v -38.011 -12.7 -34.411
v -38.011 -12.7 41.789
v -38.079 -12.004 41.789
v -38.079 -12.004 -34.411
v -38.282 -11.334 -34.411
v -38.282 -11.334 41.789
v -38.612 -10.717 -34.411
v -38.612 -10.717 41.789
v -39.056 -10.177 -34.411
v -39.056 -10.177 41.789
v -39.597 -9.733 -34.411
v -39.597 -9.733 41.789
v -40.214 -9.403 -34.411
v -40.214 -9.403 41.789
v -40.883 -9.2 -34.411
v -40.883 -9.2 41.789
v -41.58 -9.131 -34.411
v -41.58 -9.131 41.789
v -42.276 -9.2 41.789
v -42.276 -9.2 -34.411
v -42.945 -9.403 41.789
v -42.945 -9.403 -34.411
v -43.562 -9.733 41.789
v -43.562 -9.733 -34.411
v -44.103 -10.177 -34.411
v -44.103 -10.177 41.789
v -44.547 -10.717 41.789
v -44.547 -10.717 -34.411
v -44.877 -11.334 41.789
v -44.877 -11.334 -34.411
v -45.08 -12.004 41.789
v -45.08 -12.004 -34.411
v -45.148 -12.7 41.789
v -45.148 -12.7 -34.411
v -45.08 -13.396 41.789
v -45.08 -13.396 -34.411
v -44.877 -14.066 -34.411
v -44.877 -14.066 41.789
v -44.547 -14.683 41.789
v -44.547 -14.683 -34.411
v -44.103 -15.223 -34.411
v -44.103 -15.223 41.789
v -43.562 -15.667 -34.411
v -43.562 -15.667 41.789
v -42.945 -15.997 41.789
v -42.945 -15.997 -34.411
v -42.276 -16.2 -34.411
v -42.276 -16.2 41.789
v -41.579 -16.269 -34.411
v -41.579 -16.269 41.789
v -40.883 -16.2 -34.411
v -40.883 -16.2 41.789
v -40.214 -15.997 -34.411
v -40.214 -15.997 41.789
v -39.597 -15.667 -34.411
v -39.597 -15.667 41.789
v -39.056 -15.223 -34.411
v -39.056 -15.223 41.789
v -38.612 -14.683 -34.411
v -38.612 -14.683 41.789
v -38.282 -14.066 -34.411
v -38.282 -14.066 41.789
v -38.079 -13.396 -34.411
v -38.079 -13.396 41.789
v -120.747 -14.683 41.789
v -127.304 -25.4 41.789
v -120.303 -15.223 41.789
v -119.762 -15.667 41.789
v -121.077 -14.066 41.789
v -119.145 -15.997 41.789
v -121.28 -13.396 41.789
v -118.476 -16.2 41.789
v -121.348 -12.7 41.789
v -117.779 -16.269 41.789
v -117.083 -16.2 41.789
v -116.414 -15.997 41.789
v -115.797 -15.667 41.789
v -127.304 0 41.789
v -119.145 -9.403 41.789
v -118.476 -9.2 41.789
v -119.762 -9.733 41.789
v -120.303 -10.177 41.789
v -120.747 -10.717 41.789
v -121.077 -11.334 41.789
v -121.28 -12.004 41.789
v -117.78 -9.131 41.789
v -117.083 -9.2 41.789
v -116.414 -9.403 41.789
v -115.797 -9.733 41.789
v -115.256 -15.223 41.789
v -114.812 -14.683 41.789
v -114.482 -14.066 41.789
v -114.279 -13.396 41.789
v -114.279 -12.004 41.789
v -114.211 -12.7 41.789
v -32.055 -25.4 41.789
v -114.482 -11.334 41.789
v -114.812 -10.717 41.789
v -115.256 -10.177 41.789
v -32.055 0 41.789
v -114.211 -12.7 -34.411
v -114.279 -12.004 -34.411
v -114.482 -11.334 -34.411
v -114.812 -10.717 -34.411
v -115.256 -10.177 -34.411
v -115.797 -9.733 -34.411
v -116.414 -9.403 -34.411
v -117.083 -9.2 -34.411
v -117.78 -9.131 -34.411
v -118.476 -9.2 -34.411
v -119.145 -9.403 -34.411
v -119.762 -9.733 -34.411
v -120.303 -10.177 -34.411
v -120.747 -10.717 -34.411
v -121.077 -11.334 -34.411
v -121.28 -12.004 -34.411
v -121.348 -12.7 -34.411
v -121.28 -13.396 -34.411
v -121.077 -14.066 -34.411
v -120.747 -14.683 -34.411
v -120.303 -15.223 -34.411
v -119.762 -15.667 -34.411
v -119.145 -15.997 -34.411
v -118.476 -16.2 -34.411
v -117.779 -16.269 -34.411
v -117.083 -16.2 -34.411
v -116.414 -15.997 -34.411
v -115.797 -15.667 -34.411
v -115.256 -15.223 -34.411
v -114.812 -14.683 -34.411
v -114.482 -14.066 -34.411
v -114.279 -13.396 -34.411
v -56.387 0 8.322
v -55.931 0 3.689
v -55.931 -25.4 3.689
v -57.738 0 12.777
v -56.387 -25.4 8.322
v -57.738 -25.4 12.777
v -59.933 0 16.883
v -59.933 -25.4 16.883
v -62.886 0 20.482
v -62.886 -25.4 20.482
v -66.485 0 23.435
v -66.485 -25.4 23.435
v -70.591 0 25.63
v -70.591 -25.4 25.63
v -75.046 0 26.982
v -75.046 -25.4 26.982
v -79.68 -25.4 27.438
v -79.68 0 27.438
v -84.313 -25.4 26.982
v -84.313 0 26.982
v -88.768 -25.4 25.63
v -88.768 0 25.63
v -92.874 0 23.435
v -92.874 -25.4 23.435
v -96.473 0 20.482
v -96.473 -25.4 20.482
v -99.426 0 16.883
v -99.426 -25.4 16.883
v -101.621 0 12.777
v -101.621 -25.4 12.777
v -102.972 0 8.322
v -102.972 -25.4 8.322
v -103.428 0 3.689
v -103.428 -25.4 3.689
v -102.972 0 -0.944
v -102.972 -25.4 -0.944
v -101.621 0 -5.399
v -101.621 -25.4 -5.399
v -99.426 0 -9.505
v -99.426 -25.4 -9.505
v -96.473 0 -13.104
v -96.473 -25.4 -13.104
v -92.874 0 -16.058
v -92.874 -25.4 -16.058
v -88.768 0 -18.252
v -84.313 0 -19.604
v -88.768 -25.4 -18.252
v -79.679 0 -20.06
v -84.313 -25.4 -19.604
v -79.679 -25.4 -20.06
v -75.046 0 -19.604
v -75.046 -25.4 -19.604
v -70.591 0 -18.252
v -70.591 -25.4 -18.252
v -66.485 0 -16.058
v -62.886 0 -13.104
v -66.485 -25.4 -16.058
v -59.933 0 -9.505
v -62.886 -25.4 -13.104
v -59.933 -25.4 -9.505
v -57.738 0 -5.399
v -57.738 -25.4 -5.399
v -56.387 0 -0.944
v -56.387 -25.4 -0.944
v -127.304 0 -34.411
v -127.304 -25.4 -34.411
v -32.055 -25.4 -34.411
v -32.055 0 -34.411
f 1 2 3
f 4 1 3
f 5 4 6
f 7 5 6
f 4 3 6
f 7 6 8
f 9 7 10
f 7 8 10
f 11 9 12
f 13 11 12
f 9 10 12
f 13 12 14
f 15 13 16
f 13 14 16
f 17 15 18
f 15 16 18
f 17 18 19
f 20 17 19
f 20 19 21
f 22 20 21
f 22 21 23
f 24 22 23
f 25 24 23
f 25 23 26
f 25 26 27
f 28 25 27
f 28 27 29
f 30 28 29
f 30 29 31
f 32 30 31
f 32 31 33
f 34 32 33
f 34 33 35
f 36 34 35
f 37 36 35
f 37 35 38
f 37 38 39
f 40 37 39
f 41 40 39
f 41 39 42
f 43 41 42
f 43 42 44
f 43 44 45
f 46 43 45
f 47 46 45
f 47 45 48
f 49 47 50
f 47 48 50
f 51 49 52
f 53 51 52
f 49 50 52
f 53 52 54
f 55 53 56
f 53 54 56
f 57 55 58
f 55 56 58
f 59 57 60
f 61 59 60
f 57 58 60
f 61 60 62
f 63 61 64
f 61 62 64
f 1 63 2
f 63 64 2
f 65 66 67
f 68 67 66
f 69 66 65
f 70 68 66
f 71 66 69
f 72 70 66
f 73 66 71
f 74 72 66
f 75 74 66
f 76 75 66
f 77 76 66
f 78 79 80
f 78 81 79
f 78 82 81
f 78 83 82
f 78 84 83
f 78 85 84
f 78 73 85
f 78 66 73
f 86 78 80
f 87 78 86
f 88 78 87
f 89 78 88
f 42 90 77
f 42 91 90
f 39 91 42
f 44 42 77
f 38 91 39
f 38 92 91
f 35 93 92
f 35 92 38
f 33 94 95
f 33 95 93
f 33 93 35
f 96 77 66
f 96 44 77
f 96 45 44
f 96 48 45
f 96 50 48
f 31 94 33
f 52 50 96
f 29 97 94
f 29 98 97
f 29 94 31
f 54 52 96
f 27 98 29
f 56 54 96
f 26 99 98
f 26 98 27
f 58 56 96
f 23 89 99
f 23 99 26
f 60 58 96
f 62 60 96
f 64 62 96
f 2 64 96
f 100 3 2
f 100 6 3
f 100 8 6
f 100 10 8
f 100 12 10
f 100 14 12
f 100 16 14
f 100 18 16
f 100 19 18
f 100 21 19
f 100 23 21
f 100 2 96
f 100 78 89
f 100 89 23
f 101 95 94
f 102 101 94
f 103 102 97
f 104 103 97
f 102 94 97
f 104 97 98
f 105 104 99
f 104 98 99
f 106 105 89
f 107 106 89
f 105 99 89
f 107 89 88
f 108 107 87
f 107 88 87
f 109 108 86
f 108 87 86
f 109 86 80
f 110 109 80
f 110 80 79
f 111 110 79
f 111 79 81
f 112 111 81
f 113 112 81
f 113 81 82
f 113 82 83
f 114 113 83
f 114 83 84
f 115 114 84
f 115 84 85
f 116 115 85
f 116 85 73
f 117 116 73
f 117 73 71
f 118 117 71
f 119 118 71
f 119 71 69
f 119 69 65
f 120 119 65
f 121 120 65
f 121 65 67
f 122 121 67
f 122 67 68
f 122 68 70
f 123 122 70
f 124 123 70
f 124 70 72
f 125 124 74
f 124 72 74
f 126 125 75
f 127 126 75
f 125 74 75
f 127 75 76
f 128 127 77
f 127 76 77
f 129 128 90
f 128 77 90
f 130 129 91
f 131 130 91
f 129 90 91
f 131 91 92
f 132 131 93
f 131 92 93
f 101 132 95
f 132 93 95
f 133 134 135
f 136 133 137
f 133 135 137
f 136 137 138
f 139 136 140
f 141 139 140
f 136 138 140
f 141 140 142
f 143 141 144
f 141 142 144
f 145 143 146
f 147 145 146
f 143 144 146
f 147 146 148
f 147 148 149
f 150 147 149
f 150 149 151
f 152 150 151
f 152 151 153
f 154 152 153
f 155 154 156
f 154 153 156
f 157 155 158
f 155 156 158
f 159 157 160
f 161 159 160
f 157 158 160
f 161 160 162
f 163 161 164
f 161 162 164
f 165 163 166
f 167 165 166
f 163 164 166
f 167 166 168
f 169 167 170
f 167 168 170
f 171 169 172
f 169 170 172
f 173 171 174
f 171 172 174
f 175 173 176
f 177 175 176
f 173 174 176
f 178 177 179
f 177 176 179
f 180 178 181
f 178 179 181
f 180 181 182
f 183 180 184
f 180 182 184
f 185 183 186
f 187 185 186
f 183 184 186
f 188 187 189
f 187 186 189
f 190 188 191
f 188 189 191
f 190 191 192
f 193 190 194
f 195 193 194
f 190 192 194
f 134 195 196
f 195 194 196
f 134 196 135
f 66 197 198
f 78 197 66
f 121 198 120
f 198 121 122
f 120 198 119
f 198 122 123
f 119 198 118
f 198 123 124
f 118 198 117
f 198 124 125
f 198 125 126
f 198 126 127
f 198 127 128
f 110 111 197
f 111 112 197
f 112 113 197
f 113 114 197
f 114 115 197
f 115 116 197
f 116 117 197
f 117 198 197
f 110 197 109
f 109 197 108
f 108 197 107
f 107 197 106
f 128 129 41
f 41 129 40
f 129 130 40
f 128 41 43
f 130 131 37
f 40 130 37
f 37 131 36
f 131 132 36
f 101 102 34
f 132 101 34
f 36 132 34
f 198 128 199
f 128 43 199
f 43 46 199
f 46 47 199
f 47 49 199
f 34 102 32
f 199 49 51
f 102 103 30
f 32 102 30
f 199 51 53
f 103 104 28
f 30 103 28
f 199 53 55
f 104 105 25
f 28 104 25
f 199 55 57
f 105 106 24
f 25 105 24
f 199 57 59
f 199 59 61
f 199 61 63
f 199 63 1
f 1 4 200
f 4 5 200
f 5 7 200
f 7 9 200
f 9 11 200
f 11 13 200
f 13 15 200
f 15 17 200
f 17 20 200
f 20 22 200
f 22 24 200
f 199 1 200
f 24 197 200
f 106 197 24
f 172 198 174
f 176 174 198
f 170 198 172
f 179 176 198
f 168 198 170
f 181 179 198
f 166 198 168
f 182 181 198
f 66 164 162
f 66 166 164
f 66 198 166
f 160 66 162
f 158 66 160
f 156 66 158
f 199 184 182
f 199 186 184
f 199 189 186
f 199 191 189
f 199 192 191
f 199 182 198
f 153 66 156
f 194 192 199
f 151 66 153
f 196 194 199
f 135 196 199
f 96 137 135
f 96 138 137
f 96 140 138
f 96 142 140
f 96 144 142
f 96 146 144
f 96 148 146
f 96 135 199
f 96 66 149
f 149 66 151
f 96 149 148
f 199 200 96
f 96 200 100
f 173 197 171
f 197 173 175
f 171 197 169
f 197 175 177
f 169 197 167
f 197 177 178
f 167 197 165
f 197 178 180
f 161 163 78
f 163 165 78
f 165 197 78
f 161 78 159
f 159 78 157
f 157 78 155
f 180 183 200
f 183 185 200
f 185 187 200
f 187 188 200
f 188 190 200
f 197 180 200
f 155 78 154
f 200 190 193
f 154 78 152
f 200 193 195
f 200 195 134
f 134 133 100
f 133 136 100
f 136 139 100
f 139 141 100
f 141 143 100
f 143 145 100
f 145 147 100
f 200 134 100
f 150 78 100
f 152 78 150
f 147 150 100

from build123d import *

# Parameters (mm, degrees)
F0_W     = 95.25
F0_H     = 76.2
F1_DEPTH = 25.4
F2_R     = 23.749
F3_DEPTH = 25.4
F4_R     = 3.5687
F5_DEPTH = 76.201


with BuildPart() as f1:
    # F0 (on Front) → F1 (new body)
    with BuildSketch(Plane.XZ):
        with Locations((-79.6795, 3.688855)):
            Rectangle(F0_W, F0_H)
    extrude(amount=F1_DEPTH)

    # F2 (on face) → F3 (cut)
    with BuildSketch(Plane.XZ.offset(25.4)):
        with Locations((-79.6795, 3.688855)):
            Circle(F2_R)
    extrude(amount=-F3_DEPTH, mode=Mode.SUBTRACT)

    # F4 (on face) → F5 (cut, through all)
    with BuildSketch(Plane.XY.offset(41.788855)):
        with Locations((-41.5795, -12.7)):
            Circle(F4_R)
        with Locations((-117.7795, -12.7)):
            Circle(F4_R)
    extrude(amount=-F5_DEPTH, mode=Mode.SUBTRACT)


solid = f1.part
